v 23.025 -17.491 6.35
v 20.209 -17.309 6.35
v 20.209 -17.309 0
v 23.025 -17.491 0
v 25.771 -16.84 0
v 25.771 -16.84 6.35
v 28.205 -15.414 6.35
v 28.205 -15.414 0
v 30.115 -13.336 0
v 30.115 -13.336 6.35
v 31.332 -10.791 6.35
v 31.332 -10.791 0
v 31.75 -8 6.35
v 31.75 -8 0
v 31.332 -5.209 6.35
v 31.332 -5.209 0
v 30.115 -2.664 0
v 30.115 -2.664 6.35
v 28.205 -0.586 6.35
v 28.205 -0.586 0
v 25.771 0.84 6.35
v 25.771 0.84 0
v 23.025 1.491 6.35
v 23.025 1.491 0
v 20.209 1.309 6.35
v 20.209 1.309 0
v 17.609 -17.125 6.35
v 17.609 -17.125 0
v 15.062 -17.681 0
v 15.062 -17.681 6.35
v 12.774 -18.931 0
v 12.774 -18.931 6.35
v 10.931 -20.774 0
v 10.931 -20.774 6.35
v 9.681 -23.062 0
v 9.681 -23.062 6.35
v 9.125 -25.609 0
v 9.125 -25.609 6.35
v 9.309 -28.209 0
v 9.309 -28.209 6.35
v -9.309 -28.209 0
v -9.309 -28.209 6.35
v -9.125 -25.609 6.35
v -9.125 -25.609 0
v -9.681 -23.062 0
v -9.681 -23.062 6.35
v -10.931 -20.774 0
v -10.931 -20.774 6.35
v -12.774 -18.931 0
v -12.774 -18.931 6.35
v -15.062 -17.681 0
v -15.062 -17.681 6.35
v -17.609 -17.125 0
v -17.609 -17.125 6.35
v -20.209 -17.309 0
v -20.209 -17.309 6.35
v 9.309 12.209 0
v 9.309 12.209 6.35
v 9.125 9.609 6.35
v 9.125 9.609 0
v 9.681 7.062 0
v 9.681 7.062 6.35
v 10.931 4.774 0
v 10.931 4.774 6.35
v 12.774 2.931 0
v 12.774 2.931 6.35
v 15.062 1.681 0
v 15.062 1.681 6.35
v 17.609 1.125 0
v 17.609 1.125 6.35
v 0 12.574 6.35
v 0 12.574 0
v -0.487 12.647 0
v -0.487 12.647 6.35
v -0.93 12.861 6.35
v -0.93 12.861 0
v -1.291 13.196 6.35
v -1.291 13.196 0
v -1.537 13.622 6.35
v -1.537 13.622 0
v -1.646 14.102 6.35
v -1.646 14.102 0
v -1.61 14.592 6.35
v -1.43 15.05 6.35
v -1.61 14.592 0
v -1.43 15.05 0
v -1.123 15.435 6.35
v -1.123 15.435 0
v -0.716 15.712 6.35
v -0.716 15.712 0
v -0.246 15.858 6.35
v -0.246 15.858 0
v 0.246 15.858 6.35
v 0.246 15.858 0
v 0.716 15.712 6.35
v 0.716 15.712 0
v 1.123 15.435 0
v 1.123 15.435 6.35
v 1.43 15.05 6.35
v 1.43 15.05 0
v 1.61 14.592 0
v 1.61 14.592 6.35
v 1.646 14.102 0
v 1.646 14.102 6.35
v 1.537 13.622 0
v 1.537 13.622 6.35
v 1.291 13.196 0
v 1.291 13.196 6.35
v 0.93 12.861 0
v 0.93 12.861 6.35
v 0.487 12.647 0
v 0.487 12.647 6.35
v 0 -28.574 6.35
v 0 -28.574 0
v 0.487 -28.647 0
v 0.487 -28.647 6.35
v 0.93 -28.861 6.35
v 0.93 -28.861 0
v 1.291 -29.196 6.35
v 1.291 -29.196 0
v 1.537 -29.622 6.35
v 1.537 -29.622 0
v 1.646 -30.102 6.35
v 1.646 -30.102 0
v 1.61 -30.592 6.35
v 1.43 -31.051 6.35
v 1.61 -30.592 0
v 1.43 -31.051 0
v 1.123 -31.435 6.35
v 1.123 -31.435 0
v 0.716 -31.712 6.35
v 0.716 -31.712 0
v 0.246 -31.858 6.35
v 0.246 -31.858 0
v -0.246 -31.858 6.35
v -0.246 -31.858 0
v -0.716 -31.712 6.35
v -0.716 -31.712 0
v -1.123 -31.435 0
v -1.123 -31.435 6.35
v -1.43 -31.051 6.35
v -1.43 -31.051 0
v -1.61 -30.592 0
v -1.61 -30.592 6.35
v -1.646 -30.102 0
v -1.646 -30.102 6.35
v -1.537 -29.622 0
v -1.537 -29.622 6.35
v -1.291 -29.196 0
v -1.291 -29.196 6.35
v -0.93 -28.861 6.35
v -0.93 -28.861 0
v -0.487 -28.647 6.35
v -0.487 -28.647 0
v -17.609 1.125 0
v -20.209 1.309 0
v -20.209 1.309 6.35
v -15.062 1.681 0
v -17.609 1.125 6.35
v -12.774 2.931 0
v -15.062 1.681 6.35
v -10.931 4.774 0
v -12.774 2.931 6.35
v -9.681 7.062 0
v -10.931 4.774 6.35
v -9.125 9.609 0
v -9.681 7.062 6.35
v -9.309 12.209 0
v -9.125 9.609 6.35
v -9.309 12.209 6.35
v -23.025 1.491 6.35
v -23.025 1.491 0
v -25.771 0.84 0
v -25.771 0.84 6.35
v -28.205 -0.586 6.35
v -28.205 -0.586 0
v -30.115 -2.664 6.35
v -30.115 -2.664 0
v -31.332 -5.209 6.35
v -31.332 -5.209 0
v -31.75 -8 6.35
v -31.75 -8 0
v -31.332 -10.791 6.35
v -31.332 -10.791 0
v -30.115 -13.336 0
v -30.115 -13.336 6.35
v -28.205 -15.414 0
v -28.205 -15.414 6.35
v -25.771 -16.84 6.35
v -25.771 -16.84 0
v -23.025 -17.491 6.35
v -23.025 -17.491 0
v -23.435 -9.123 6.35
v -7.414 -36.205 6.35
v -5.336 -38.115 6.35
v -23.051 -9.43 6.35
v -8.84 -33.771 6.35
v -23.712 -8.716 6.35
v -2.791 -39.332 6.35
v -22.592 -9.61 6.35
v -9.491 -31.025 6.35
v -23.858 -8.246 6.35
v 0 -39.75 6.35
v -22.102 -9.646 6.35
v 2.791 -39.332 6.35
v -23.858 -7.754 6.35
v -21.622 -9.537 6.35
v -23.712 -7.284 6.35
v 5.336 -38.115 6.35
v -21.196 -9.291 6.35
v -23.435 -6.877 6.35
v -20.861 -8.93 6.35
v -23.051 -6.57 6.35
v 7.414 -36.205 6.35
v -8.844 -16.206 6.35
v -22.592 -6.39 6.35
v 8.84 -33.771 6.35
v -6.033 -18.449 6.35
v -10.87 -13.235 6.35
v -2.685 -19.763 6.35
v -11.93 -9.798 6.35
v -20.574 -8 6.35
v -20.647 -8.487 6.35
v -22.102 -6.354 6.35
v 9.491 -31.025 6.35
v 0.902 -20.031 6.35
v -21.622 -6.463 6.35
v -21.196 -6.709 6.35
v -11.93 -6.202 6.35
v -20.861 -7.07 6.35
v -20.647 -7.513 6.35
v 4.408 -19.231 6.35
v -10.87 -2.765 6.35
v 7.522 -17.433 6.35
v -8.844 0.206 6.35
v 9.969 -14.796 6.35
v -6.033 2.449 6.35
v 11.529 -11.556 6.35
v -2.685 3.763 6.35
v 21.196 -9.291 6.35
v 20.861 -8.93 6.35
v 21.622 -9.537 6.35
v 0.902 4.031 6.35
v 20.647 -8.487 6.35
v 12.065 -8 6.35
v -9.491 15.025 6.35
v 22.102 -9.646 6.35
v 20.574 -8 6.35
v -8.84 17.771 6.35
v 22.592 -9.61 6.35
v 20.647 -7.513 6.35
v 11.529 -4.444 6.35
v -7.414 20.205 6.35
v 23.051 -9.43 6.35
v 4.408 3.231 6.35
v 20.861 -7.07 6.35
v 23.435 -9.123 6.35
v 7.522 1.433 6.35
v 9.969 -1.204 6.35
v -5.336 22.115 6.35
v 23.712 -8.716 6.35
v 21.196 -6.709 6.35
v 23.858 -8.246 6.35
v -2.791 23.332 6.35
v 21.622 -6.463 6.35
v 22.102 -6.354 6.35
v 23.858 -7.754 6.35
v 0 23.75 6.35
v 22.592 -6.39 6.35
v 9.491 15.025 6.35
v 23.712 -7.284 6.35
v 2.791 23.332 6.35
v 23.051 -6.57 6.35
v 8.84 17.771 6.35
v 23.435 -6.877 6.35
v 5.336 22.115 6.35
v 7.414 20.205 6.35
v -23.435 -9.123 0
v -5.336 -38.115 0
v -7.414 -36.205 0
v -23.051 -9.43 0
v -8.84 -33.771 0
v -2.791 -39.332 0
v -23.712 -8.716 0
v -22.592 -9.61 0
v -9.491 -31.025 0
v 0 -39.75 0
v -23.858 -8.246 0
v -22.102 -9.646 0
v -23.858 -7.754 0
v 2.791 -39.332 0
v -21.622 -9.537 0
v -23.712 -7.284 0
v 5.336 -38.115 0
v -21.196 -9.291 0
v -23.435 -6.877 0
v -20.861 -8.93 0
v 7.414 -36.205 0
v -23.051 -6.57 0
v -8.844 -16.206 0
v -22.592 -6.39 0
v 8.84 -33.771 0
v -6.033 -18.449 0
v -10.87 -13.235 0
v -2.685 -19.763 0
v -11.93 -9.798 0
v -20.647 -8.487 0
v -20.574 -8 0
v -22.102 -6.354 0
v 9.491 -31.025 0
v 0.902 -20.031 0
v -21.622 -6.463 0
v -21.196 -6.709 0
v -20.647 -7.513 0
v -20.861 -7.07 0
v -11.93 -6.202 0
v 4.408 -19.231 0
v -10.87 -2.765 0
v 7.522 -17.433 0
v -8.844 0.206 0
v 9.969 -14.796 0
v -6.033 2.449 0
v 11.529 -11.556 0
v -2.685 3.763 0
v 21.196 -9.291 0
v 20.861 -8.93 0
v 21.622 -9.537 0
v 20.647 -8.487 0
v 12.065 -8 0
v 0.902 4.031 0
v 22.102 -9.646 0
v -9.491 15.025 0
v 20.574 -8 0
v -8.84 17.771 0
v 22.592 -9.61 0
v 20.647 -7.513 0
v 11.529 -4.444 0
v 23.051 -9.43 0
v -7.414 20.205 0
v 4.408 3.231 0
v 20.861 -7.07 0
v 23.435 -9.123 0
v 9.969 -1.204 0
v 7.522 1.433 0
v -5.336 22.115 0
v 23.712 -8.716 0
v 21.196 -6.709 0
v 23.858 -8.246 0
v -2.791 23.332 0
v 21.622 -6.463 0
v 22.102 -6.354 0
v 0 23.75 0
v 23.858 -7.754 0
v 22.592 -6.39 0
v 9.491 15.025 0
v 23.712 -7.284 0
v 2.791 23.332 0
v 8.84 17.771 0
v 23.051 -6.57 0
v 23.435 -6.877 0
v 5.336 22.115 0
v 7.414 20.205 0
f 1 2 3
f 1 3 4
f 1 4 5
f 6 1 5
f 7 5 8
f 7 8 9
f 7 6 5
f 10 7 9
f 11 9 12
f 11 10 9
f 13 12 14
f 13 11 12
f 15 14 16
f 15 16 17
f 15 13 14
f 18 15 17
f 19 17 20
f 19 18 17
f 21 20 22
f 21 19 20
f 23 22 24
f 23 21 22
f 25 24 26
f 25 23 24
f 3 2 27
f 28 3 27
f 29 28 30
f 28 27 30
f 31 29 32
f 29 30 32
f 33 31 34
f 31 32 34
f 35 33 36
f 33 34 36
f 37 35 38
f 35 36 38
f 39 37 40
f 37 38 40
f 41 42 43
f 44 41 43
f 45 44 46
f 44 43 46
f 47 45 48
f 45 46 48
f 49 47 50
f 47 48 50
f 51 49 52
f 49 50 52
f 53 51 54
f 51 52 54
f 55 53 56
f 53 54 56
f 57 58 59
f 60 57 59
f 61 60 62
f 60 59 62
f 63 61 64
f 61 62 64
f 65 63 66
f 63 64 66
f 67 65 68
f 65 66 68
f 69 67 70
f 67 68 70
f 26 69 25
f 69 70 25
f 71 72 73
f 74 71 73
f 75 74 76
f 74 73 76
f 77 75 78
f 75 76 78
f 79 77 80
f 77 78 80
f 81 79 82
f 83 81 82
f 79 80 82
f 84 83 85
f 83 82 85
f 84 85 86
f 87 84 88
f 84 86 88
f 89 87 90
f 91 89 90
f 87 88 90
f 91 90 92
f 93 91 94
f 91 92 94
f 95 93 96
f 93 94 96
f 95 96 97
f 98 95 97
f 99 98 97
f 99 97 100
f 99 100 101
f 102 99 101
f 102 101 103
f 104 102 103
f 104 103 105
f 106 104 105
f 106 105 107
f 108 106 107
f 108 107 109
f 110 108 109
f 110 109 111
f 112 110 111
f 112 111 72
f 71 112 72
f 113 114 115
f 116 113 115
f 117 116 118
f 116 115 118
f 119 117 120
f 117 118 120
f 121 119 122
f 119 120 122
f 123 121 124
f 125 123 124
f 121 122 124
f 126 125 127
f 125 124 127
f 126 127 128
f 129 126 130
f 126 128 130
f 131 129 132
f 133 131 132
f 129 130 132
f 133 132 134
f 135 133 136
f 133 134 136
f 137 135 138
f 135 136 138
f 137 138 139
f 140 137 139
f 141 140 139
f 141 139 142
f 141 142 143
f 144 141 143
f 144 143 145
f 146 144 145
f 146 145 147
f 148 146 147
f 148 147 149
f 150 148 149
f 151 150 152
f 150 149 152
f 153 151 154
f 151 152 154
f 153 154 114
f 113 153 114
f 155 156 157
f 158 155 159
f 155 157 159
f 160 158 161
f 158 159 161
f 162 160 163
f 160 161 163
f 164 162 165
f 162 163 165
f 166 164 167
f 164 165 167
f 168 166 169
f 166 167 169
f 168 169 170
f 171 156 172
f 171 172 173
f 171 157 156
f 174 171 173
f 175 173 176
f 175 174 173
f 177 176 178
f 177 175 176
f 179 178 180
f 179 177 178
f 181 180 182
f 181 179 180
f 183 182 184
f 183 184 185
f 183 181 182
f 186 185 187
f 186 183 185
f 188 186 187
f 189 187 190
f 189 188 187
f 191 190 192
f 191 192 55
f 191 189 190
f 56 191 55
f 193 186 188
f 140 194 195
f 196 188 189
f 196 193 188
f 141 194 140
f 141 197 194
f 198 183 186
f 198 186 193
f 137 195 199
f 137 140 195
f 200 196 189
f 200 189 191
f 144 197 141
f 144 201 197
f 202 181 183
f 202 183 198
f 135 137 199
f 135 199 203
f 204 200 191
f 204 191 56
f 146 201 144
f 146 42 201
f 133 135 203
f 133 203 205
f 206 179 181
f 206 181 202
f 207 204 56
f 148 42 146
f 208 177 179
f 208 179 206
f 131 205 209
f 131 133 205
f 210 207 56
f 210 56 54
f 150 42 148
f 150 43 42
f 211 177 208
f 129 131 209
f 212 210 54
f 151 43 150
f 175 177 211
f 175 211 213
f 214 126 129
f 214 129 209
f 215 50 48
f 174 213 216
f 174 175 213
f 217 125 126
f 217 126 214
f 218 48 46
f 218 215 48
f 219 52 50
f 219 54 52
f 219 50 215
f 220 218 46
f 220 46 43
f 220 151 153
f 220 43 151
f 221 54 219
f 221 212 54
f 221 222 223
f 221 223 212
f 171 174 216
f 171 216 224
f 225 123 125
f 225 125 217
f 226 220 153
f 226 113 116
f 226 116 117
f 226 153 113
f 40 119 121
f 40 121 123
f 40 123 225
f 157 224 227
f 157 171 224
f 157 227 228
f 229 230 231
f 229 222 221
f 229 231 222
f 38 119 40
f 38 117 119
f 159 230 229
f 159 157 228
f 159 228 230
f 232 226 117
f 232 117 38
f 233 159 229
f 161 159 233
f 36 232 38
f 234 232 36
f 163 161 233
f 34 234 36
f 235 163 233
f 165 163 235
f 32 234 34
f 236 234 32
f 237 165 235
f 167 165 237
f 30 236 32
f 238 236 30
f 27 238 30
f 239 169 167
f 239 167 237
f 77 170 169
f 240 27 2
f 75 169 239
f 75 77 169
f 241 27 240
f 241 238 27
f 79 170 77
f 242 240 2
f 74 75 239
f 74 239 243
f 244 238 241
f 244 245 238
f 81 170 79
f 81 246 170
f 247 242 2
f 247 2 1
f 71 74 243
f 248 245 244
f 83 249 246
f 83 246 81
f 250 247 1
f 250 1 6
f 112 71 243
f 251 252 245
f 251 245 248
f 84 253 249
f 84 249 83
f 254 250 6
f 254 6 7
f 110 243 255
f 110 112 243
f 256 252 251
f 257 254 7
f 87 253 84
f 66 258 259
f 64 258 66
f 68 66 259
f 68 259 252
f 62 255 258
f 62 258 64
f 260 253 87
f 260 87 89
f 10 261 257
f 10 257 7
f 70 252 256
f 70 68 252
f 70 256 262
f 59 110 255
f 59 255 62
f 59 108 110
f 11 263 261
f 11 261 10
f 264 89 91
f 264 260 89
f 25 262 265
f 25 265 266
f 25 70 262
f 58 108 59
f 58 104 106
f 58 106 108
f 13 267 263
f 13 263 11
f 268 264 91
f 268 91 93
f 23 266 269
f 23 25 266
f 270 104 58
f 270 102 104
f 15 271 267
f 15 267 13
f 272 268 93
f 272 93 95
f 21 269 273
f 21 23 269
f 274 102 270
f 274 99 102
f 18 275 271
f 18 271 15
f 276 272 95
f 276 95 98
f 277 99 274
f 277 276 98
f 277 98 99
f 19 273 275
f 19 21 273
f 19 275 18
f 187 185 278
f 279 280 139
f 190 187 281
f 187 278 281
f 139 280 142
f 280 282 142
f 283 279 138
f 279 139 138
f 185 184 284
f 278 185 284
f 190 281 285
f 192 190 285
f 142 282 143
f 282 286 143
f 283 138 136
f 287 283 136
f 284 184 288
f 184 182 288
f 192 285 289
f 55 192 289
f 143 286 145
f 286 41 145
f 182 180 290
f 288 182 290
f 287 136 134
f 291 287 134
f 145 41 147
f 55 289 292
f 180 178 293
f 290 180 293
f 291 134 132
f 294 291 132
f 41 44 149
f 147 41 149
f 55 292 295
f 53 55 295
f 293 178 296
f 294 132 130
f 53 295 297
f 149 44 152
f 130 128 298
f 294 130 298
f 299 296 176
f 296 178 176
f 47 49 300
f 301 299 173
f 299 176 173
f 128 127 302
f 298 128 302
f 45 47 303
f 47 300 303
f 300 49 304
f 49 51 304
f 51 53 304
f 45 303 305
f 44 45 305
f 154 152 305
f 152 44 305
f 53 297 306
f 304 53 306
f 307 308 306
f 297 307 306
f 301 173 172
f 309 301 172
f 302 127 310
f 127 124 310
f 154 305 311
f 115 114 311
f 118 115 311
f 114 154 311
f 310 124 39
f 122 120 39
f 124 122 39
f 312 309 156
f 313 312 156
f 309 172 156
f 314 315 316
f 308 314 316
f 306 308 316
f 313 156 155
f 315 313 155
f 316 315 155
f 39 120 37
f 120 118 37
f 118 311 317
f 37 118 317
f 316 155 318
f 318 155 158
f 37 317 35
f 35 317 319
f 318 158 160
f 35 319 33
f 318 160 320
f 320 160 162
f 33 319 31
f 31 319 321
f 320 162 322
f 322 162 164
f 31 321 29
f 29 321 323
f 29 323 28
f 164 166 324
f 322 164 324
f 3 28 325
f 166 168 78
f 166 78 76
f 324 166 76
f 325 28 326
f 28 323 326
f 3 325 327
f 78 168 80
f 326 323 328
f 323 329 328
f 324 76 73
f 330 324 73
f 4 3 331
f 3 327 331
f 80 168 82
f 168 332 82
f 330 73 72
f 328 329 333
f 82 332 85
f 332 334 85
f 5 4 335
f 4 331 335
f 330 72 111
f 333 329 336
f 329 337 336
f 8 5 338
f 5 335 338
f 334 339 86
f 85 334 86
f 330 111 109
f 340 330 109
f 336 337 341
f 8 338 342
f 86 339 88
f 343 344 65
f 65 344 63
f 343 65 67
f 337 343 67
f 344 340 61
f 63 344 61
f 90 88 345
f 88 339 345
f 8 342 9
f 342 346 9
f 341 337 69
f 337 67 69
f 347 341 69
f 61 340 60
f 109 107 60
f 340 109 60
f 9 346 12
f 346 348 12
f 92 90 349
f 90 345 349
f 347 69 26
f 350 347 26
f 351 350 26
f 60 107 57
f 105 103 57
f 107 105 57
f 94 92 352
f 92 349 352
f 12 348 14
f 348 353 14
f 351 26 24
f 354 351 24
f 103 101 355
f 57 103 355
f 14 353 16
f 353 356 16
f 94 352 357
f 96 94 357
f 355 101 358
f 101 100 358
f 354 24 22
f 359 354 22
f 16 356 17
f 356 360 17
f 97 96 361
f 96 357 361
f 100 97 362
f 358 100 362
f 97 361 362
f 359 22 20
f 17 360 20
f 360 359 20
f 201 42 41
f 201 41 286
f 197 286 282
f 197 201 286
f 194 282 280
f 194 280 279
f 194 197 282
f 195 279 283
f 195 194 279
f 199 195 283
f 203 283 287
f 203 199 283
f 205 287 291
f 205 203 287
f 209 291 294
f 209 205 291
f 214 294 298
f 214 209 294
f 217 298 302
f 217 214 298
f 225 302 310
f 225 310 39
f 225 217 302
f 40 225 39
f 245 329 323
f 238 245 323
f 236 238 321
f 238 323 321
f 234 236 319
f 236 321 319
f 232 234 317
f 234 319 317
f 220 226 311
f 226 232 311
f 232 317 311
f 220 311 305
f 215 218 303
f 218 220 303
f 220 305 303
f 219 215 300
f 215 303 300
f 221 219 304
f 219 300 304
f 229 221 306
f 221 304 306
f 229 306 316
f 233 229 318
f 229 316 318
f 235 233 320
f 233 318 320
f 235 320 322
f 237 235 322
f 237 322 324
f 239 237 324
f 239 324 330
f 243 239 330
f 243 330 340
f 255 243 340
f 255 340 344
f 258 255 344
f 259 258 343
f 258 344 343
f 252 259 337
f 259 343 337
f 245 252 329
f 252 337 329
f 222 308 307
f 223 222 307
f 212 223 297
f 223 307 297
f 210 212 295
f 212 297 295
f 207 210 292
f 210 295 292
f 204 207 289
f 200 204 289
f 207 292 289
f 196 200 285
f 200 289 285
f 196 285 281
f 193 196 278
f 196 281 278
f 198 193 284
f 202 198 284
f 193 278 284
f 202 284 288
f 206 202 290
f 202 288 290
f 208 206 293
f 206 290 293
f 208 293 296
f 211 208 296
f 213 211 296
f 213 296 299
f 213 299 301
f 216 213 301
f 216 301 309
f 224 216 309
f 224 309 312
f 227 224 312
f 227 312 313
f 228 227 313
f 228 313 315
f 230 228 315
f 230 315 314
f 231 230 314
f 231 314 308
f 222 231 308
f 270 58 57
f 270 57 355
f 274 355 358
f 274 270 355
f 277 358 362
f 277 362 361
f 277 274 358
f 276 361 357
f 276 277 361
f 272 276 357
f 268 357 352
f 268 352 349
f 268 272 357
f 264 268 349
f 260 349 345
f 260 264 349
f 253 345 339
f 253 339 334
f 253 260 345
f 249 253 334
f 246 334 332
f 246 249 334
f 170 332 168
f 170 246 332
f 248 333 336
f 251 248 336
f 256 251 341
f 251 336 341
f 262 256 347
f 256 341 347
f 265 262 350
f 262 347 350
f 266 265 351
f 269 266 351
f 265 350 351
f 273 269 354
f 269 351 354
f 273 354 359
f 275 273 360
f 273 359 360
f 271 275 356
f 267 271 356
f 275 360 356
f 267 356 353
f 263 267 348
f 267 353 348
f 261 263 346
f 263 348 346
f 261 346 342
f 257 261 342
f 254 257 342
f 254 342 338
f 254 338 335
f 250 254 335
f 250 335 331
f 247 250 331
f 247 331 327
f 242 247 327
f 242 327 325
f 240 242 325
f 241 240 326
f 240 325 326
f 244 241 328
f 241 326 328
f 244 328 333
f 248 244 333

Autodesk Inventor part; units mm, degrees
ref_plane "YZ Plane" through (0, 0, 0) normal (1, 0, 0) x (0, 1, 0)
ref_plane "XZ Plane" through (0, 0, 0) normal (0, 1, 0) x (-1, 0, 0)
ref_plane "XY Plane" through (0, 0, 0) normal (0, 0, 1) x (1, 0, 0)
sketch "Sketch1" plane through (0, 0, 0) normal (0, 0, 1) x (1, 0, 0)
  arc A0 (9.4191, 43.3754) -> (11.0761, 45.5644) centre (1.4765, 51.109) ccw projected
  arc A1 (2.6827, 44.1627) -> (9.4191, 43.3754) centre (6.35, 46.3277) ccw projected
  arc A2 (1.5753, 46.6749) -> (2.6827, 44.1627) centre (12.1948, 49.8562) ccw projected
  arc A3 (-9.4191, 43.3754) -> (-2.6827, 44.1627) centre (-6.35, 46.3277) ccw projected
  arc A4 (-11.0761, 45.5644) -> (-9.4191, 43.3754) centre (-1.4765, 51.109) ccw projected
  arc A5 (-21.0132, 39.8183) -> (-14.64, 42.138) centre (-18.7077, 43.3989) ccw projected
  arc A6 (-23.1303, 41.5662) -> (-21.0132, 39.8183) centre (-15.0682, 49.1752) ccw projected
  arc A7 (-31.4745, 33.6834) -> (-25.808, 37.4103) centre (-30.0568, 37.6992) ccw projected
  arc A8 (-33.9376, 34.896) -> (-31.4745, 33.6834) centre (-27.8475, 44.1591) ccw projected
  arc A9 (-40.2389, 25.3013) -> (-35.5847, 30.2346) centre (-39.7856, 29.5357) ccw projected
  arc A10 (-42.9153, 25.9131) -> (-40.2389, 25.3013) centre (-39.1256, 36.331) ccw projected
  arc A11 (-46.8341, 15.1239) -> (-43.443, 20.9975) centre (-47.3695, 19.3488) ccw projected
  arc A12 (-49.5794, 15.1021) -> (-46.8341, 15.1239) centre (-48.2944, 26.1131) ccw projected
  arc A13 (-50.9044, 3.6999) -> (-48.9593, 10.1973) centre (-52.3997, 7.6874) ccw projected
  arc A14 (-53.5707, 3.0455) -> (-50.9044, 3.6999) centre (-54.8597, 14.0561) ccw projected
  arc A15 (-52.2305, -8.3548) -> (-51.8361, -1.584) centre (-54.605, -4.8196) ccw projected
  arc A16 (-54.674, -9.6064) -> (-52.2305, -8.3548) centre (-58.4674, 0.8101) ccw projected
  arc A17 (-50.7408, -20.3904) -> (-51.9185, -13.7112) centre (-53.8666, -17.4981) ccw projected
  arc A18 (-52.8298, -22.1718) -> (-50.7408, -20.3904) centre (-58.9232, -12.9109) ccw projected
  arc A19 (-46.5156, -31.7581) -> (-49.2019, -25.5305) centre (-50.2242, -29.6646) ccw projected
  arc A20 (-48.1375, -33.9732) -> (-46.5156, -31.7581) centre (-56.2023, -26.3671) ccw projected
  arc A21 (-39.7828, -41.8449) -> (-43.8329, -36.4047) centre (-43.8742, -40.6631) ccw projected
  arc A22 (-40.8501, -44.3744) -> (-39.7828, -41.8449) centre (-50.4517, -38.8332) ccw projected
  arc A23 (-30.9053, -50.1072) -> (-36.1008, -45.7476) centre (-35.1589, -49.9008) ccw projected
  arc A24 (-31.3605, -52.8146) -> (-30.9053, -50.1072) centre (-41.9811, -49.637) ccw projected
  arc A25 (-20.3617, -56.0994) -> (-26.4225, -53.0555) centre (-24.5482, -56.8795) ccw projected
  arc A26 (-20.1802, -58.8388) -> (-20.3617, -56.0994) centre (-31.2473, -58.1962) ccw projected
  arc A27 (-8.7203, -59.4986) -> (-15.3198, -57.9345) centre (-12.6141, -61.2232) ccw projected
  arc A28 (-7.912, -62.1223) -> (-8.7203, -59.4986) centre (-18.829, -64.0493) ccw projected
  arc A29 (3.3911, -60.1215) -> (-3.3911, -60.1215) centre (0, -62.6976) ccw projected
  arc A30 (4.7827, -62.4881) -> (3.3911, -60.1215) centre (-5.3956, -66.8807) ccw projected
  arc A31 (15.3198, -57.9345) -> (8.7203, -59.4986) centre (12.6141, -61.2232) ccw projected
  arc A32 (17.2196, -59.9164) -> (15.3198, -57.9345) centre (8.3287, -66.5379) ccw projected
  arc A33 (26.4225, -53.0555) -> (20.3617, -56.0994) centre (24.5482, -56.8795) ccw projected
  arc A34 (28.7282, -54.5458) -> (26.4225, -53.0555) centre (21.6039, -63.0393) ccw projected
  arc A35 (36.1008, -45.7476) -> (30.9053, -50.1072) centre (35.1589, -49.9008) ccw projected
  arc A36 (38.688, -46.666) -> (36.1008, -45.7476) centre (33.7145, -56.5735) ccw projected
  arc A37 (43.8329, -36.4047) -> (39.7828, -41.8449) centre (43.8742, -40.6631) ccw projected
  arc A38 (46.5622, -36.7017) -> (43.8329, -36.4047) centre (44.0076, -47.4891) ccw projected
  arc A39 (49.2019, -25.5305) -> (46.5156, -31.7581) centre (50.2242, -29.6646) ccw projected
  arc A40 (51.9262, -25.19) -> (49.2019, -25.5305) centre (51.9282, -36.2758) ccw projected
  arc A41 (51.9185, -13.7112) -> (50.7408, -20.3904) centre (53.8666, -17.4981) ccw projected
  arc A42 (54.4908, -12.7517) -> (51.9185, -13.7112) centre (57.0493, -23.5382) ccw projected
  arc A43 (51.8361, -1.584) -> (52.2305, -8.3548) centre (54.605, -4.8196) ccw projected
  arc A44 (54.1178, -0.0572) -> (51.8361, -1.584) centre (59.0949, -9.9629) ccw projected
  arc A45 (48.9593, 10.1973) -> (50.9044, 3.6999) centre (52.3997, 7.6874) ccw projected
  arc A46 (50.8273, 12.2092) -> (48.9593, 10.1973) centre (57.9546, 3.7182) ccw projected
  arc A47 (43.443, 20.9975) -> (46.8341, 15.1239) centre (47.3695, 19.3488) ccw projected
  arc A48 (44.7967, 23.386) -> (43.443, 20.9975) centre (53.69, 16.7676) ccw projected
  arc A49 (35.5847, 30.2346) -> (40.2389, 25.3013) centre (39.7856, 29.5357) ccw projected
  arc A50 (36.3511, 32.8708) -> (35.5847, 30.2346) centre (46.531, 28.4818) ccw projected
  arc A51 (25.808, 37.4103) -> (31.4745, 33.6834) centre (30.0568, 37.6992) ccw projected
  arc A52 (25.9458, 40.1523) -> (25.808, 37.4103) centre (36.8635, 38.2292) ccw projected
  arc A53 (14.64, 42.138) -> (21.0132, 39.8183) centre (18.7077, 43.3989) ccw projected
  arc A54 (14.1417, 44.8378) -> (14.64, 42.138) centre (25.2086, 45.4844) ccw projected
  circle A55 centre (0, -8) radius 12.065
  circle A56 centre (0, -8) radius 22.225
  circle A57 centre (0, -8) radius 31.75
  circle A58 centre (22.225, -8) radius 1.27
  circle A59 centre (0, -30.225) radius 1.27
  circle A60 centre (-22.225, -8) radius 1.27
  circle A61 centre (0, 14.225) radius 1.27
  circle A62 centre (0, -8) radius 12.065 projected
  line L0 (1.4863, 46.9888) -> (1.1981, 48.0928) projected
  arc A63 (1.1981, 48.0928) -> (0.2767, 50.1653) centre (-5.564, 46.3277) ccw projected
  arc A64 (-2.6827, 44.1627) -> (-1.5753, 46.6749) centre (-12.1948, 49.8562) ccw projected
  line L1 (-11.2351, 45.8493) -> (-11.7701, 46.8571) projected
  arc A65 (-11.7701, 46.8571) -> (-13.1446, 48.6613) centre (-17.9429, 43.5802) ccw projected
  arc A66 (-14.64, 42.138) -> (-14.1417, 44.8378) centre (-25.2086, 45.4844) ccw projected
  line L2 (-23.3508, 41.8068) -> (-24.1038, 42.6641) projected
  arc A67 (-24.1038, 42.6641) -> (-25.8573, 44.1026) centre (-29.3544, 38.0519) ccw projected
  arc A68 (-25.808, 37.4103) -> (-25.9458, 40.1523) centre (-36.8635, 38.2292) ccw projected
  line L3 (-34.2076, 35.0792) -> (-35.138, 35.7397) projected
  arc A69 (-35.138, 35.7397) -> (-37.176, 36.7351) centre (-39.1835, 30.041) ccw projected
  arc A70 (-35.5847, 30.2346) -> (-36.3511, 32.8708) centre (-46.531, 28.4818) ccw projected
  line L4 (-43.2203, 26.0292) -> (-44.2779, 26.4573) projected
  arc A71 (-44.2779, 26.4573) -> (-46.4905, 26.9559) centre (-46.9001, 19.9793) ccw projected
  arc A72 (-43.443, 20.9975) -> (-44.7967, 23.386) centre (-53.69, 16.7676) ccw projected
  line L5 (-49.9029, 15.1447) -> (-51.0308, 15.3173) projected
  arc A73 (-51.0308, 15.3173) -> (-53.2988, 15.2922) centre (-52.0884, 8.4092) ccw projected
  arc A74 (-48.9593, 10.1973) -> (-50.8273, 12.2092) centre (-57.9546, 3.7182) ccw projected
  line L6 (-53.8953, 3.0124) -> (-55.0326, 2.9203) projected
  arc A75 (-55.0326, 2.9203) -> (-57.2336, 2.3728) centre (-54.4685, -4.0456) ccw projected
  arc A76 (-51.8361, -1.584) -> (-54.1178, -0.0572) centre (-59.0949, -9.9629) ccw projected
  line L7 (-54.9822, -9.7136) -> (-56.0676, -10.0655) projected
  arc A77 (-56.0676, -10.0655) -> (-58.083, -11.1058) centre (-53.9123, -16.7135) ccw projected
  arc A78 (-51.9185, -13.7112) -> (-54.4908, -12.7517) centre (-57.0493, -23.5382) ccw projected
  line L8 (-53.105, -22.3471) -> (-54.08, -22.9399) projected
  arc A79 (-54.08, -22.9399) -> (-55.8011, -24.4169) centre (-50.4496, -28.9116) ccw projected
  arc A80 (-49.2019, -25.5305) -> (-51.9262, -25.19) centre (-51.9282, -36.2758) ccw projected
  line L9 (-48.3648, -34.2073) -> (-49.1769, -35.0089) projected
  arc A81 (-49.1769, -35.0089) -> (-50.511, -36.843) centre (-44.2672, -39.9824) ccw projected
  arc A82 (-43.8329, -36.4047) -> (-46.5622, -36.7017) centre (-44.0076, -47.4891) ccw projected
  line L10 (-41.0173, -44.6545) -> (-41.6226, -45.6218) projected
  arc A83 (-41.6226, -45.6218) -> (-42.4978, -47.7142) centre (-35.6983, -49.3291) ccw projected
  arc A84 (-36.1008, -45.7476) -> (-38.688, -46.666) centre (-33.7145, -56.5735) ccw projected
  line L11 (-31.4586, -53.1258) -> (-31.8245, -54.2065) projected
  arc A85 (-31.8245, -54.2065) -> (-32.1936, -56.4444) centre (-25.2049, -56.4476) ccw projected
  arc A86 (-26.4225, -53.0555) -> (-28.7282, -54.5458) centre (-21.6039, -63.0393) ccw projected
  line L12 (-20.2039, -59.1642) -> (-20.3107, -60.3003) projected
  arc A87 (-20.3107, -60.3003) -> (-20.1537, -62.5629) centre (-13.3527, -60.9544) ccw projected
  arc A88 (-15.3198, -57.9345) -> (-17.2196, -59.9164) centre (-8.3287, -66.5379) ccw projected
  line L13 (-7.86, -62.4444) -> (-7.7019, -63.5745) projected
  arc A89 (-7.7019, -63.5745) -> (-7.0274, -65.7399) centre (-0.7807, -62.6063) ccw projected
  arc A90 (-3.3911, -60.1215) -> (-4.7827, -62.4881) centre (5.3956, -66.8807) ccw projected
  line L14 (4.9076, -62.7895) -> (5.322, -63.8527) projected
  arc A91 (5.322, -63.8527) -> (6.4777, -65.8042) centre (11.8334, -61.3144) ccw projected
  arc A92 (8.7203, -59.4986) -> (7.912, -62.1223) centre (18.829, -64.0493) ccw projected
  line L15 (17.4107, -60.1809) -> (18.0591, -61.1198) projected
  arc A93 (18.0591, -61.1198) -> (19.6337, -62.7522) centre (23.8096, -57.1484) ccw projected
  arc A94 (20.3617, -56.0994) -> (20.1802, -58.8388) centre (31.2473, -58.1962) ccw projected
  line L16 (28.9751, -54.7592) -> (29.8226, -55.5232) projected
  arc A95 (29.8226, -55.5232) -> (31.7312, -56.7485) centre (34.5022, -50.3327) ccw projected
  arc A96 (30.9053, -50.1072) -> (31.3605, -52.8146) centre (41.9811, -49.637) ccw projected
  line L17 (38.9775, -46.8167) -> (39.9783, -47.3647) projected
  arc A97 (39.9783, -47.3647) -> (42.118, -48.1167) centre (43.3348, -41.2348) ccw projected
  arc A98 (39.7828, -41.8449) -> (40.8501, -44.3744) centre (50.4517, -38.8332) ccw projected
  line L18 (46.8786, -36.7815) -> (47.9788, -37.084) projected
  arc A99 (47.9788, -37.084) -> (50.2343, -37.3223) centre (49.8312, -30.3453) ccw projected
  arc A100 (46.5156, -31.7581) -> (48.1375, -33.9732) centre (56.2023, -26.3671) ccw projected
  line L19 (52.2524, -25.1948) -> (53.3927, -25.2353) projected
  arc A101 (53.3927, -25.2353) -> (55.6424, -24.9471) centre (53.6412, -18.2511) ccw projected
  arc A102 (50.7408, -20.3904) -> (52.8298, -22.1718) centre (58.9232, -12.9109) ccw projected
  line L20 (54.8093, -12.6811) -> (55.9283, -12.4575) projected
  arc A103 (55.9283, -12.4575) -> (58.0508, -11.6583) centre (54.5593, -5.6043) ccw projected
  arc A104 (52.2305, -8.3548) -> (54.674, -9.6064) centre (58.4674, 0.8101) ccw projected
  line L21 (54.4115, 0.085) -> (55.4487, 0.5606) projected
  arc A105 (55.4487, 0.5606) -> (57.3297, 1.8278) centre (52.5362, 6.9134) ccw projected
  arc A106 (50.9044, 3.6999) -> (53.5707, 3.0455) centre (54.8597, 14.0561) ccw projected
  line L22 (51.0803, 12.4152) -> (51.9799, 13.1172) projected
  arc A107 (51.9799, 13.1172) -> (53.518, 14.784) centre (47.6808, 18.6271) ccw projected
  arc A108 (46.8341, 15.1239) -> (49.5794, 15.1021) centre (48.2944, 26.1131) ccw projected
  line L23 (44.9953, 23.6449) -> (45.7088, 24.5353) projected
  arc A109 (45.7088, 24.5353) -> (46.821, 26.512) centre (40.2549, 28.9053) ccw projected
  arc A110 (40.2389, 25.3013) -> (42.9153, 25.9131) centre (39.1256, 36.331) ccw projected
  line L24 (36.4847, 33.1685) -> (36.9736, 34.1995) projected
  arc A111 (36.9736, 34.1995) -> (37.5999, 36.3794) centre (30.6589, 37.1939) ccw projected
  arc A112 (31.4745, 33.6834) -> (33.9376, 34.896) centre (27.8475, 44.1591) ccw projected
  line L25 (26.0071, 40.4728) -> (26.2451, 41.5887) projected
  arc A113 (26.2451, 41.5887) -> (26.3518, 43.8543) centre (19.4101, 43.0461) ccw projected
  arc A114 (21.0132, 39.8183) -> (23.1303, 41.5662) centre (15.0682, 49.1752) ccw projected
  line L26 (14.1275, 45.1638) -> (14.1017, 46.3046) projected
  ellipse E0 centre (-12.8803, 49.8016) end of major axis (-24.6386, 49.2708) minor radius 11.3649 (-1.5753, 46.6749) -> (-1.4863, 46.9888) ccw projected
  ellipse E1 centre (-25.8631, 45.2731) end of major axis (-37.1821, 42.045) minor radius 11.3649 (-14.1417, 44.8378) -> (-14.1275, 45.1638) ccw projected
  ellipse E2 centre (-37.4516, 37.8727) end of major axis (-47.721, 32.1213) minor radius 11.3649 (-25.9458, 40.1523) -> (-26.0071, 40.4728) ccw projected
  ellipse E3 centre (-47.0211, 27.9993) end of major axis (-55.6873, 20.0346) minor radius 11.3649 (-36.3511, 32.8708) -> (-36.4847, 33.1685) ccw projected
  ellipse E4 centre (-54.0556, 16.1851) end of major axis (-60.6514, 6.4366) minor radius 11.3649 (-44.7967, 23.386) -> (-44.9953, 23.6449) ccw projected
  ellipse E5 centre (-58.176, 3.0671) end of major axis (-62.3459, -7.9398) minor radius 11.3649 (-50.8273, 12.2092) -> (-51.0803, 12.4152) ccw projected
  ellipse E6 centre (-59.1601, -10.6475) end of major axis (-60.6792, -22.3193) minor radius 11.3649 (-54.1178, -0.0572) -> (-54.4115, 0.085) ccw projected
  ellipse E7 centre (-56.9549, -24.2194) end of major axis (-55.7413, -35.9269) minor radius 11.3649 (-54.4908, -12.7517) -> (-54.8093, -12.6811) ccw projected
  ellipse E8 centre (-51.6792, -36.9169) end of major axis (-47.7984, -48.029) minor radius 11.3649 (-51.9262, -25.19) -> (-52.2524, -25.1948) ccw projected
  ellipse E9 centre (-43.6175, -48.0555) end of major axis (-37.2787, -57.9731) minor radius 11.3649 (-46.5622, -36.7017) -> (-46.8786, -36.7815) ccw projected
  ellipse E10 centre (-33.2043, -57.0347) end of major axis (-24.7492, -65.2231) minor radius 11.3649 (-38.688, -46.666) -> (-38.9775, -46.8167) ccw projected
  ellipse E11 centre (-21.0011, -63.3704) end of major axis (-10.8856, -69.3882) minor radius 11.3649 (-28.7282, -54.5458) -> (-28.9751, -54.7592) ccw projected
  ellipse E12 centre (-7.6657, -66.7211) end of major axis (3.565, -70.2439) minor radius 11.3649 (-17.2196, -59.9164) -> (-17.4107, -60.1809) ccw projected
  ellipse E13 centre (6.0829, -66.9061) end of major axis (17.8233, -67.7439) minor radius 11.3649 (-4.7827, -62.4881) -> (-4.9076, -62.7895) ccw projected
  ellipse E14 centre (19.5036, -63.9154) end of major axis (31.1208, -62.0232) minor radius 11.3649 (7.912, -62.1223) -> (7.86, -62.4444) ccw projected
  ellipse E15 centre (31.8729, -57.9104) end of major axis (42.7405, -53.3901) minor radius 11.3649 (20.1802, -58.8388) -> (20.2039, -59.1642) ccw projected
  ellipse E16 centre (42.5239, -49.2147) end of major axis (52.0561, -42.3099) minor radius 11.3649 (31.3605, -52.8146) -> (31.4586, -53.1258) ccw projected
  ellipse E17 centre (50.8824, -38.297) end of major axis (58.5653, -29.3801) minor radius 11.3649 (40.8501, -44.3744) -> (41.0173, -44.6545) ccw projected
  ellipse E18 centre (56.4978, -25.7461) end of major axis (61.9173, -15.2977) minor radius 11.3649 (48.1375, -33.9732) -> (48.3648, -34.2073) ccw projected
  ellipse E19 centre (59.0674, -12.2385) end of major axis (61.9313, -0.8219) minor radius 11.3649 (52.8298, -22.1718) -> (53.105, -22.3471) ccw projected
  ellipse E20 centre (58.4527, 1.4977) end of major axis (58.6065, 13.2669) minor radius 11.3649 (54.674, -9.6064) -> (54.9822, -9.7136) ccw projected
  ellipse E21 centre (54.6868, 14.7218) end of major axis (52.1223, 26.2093) minor radius 11.3649 (53.5707, 3.0455) -> (53.8953, 3.0124) ccw projected
  ellipse E22 centre (47.9727, 26.721) end of major axis (42.8281, 37.3074) minor radius 11.3649 (49.5794, 15.1021) -> (49.9029, 15.1447) ccw projected
  ellipse E23 centre (38.6724, 36.8483) end of major axis (31.2251, 45.963) minor radius 11.3649 (42.9153, 25.9131) -> (43.2203, 26.0292) ccw projected
  ellipse E24 centre (27.2872, 44.5579) end of major axis (17.9387, 51.7094) minor radius 11.3649 (33.9376, 34.896) -> (34.2076, 35.0792) ccw projected
  ellipse E25 centre (14.431, 49.4341) end of major axis (3.6852, 54.2369) minor radius 11.3649 (23.1303, 41.5662) -> (23.3508, 41.8068) ccw projected
  circle A115 centre (22.225, -8) radius 2.3812 projected
  circle A116 centre (0, 14.225) radius 2.3812 projected
  circle A117 centre (0, -30.225) radius 2.3812 projected
  circle A118 centre (-22.225, -8) radius 2.3812 projected
  ellipse E26 centre (12.8803, 49.8016) end of major axis (24.6386, 49.2708) minor radius 11.3649 (1.4863, 46.9888) -> (1.5753, 46.6749) ccw projected
  arc A119 (0.2767, 50.1653) -> (-0.2767, 50.1653) centre (0, -8) ccw projected
  arc A120 (-0.2767, 50.1653) -> (-1.1981, 48.0928) centre (5.564, 46.3277) ccw projected
  line L27 (-1.1981, 48.0928) -> (-1.4863, 46.9888) projected
  ellipse E27 centre (-0.7968, 51.214) end of major axis (10.7669, 53.4091) minor radius 11.3649 (-11.2351, 45.8493) -> (-11.0761, 45.5644) ccw projected
  arc A121 (-13.1446, 48.6613) -> (-13.6831, 48.5337) centre (0, -8) ccw projected
  arc A122 (-13.6831, 48.5337) -> (-14.1017, 46.3046) centre (-7.1148, 46.1465) ccw projected
  line L28 (-14.1017, 46.3046) -> (-14.1275, 45.1638) projected
  ellipse E28 centre (-14.431, 49.4341) end of major axis (-3.6852, 54.2369) minor radius 11.3649 (-23.3508, 41.8068) -> (-23.1303, 41.5662) ccw projected
  arc A123 (-25.8573, 44.1026) -> (-26.3518, 43.8543) centre (0, -8) ccw projected
  arc A124 (-26.3518, 43.8543) -> (-26.2451, 41.5887) centre (-19.4101, 43.0461) ccw projected
  line L29 (-26.2451, 41.5887) -> (-26.0071, 40.4728) projected
  ellipse E29 centre (-27.2872, 44.5579) end of major axis (-17.9387, 51.7094) minor radius 11.3649 (-34.2076, 35.0792) -> (-33.9376, 34.896) ccw projected
  arc A125 (-37.176, 36.7351) -> (-37.5999, 36.3794) centre (0, -8) ccw projected
  arc A126 (-37.5999, 36.3794) -> (-36.9736, 34.1995) centre (-30.6589, 37.1939) ccw projected
  line L30 (-36.9736, 34.1995) -> (-36.4847, 33.1685) projected
  ellipse E30 centre (-38.6724, 36.8483) end of major axis (-31.2251, 45.963) minor radius 11.3649 (-43.2203, 26.0292) -> (-42.9153, 25.9131) ccw projected
  arc A127 (-46.4905, 26.9559) -> (-46.821, 26.512) centre (0, -8) ccw projected
  arc A128 (-46.821, 26.512) -> (-45.7088, 24.5353) centre (-40.2549, 28.9053) ccw projected
  line L31 (-45.7088, 24.5353) -> (-44.9953, 23.6449) projected
  ellipse E31 centre (-47.9727, 26.721) end of major axis (-42.8281, 37.3074) minor radius 11.3649 (-49.9029, 15.1447) -> (-49.5794, 15.1021) ccw projected
  arc A129 (-53.2988, 15.2922) -> (-53.518, 14.784) centre (0, -8) ccw projected
  arc A130 (-53.518, 14.784) -> (-51.9799, 13.1172) centre (-47.6808, 18.6271) ccw projected
  line L32 (-51.9799, 13.1172) -> (-51.0803, 12.4152) projected
  ellipse E32 centre (-54.6868, 14.7218) end of major axis (-52.1223, 26.2093) minor radius 11.3649 (-53.8953, 3.0124) -> (-53.5707, 3.0455) ccw projected
  arc A131 (-57.2336, 2.3728) -> (-57.3297, 1.8278) centre (0, -8) ccw projected
  arc A132 (-57.3297, 1.8278) -> (-55.4487, 0.5606) centre (-52.5362, 6.9134) ccw projected
  line L33 (-55.4487, 0.5606) -> (-54.4115, 0.085) projected
  ellipse E33 centre (-58.4527, 1.4977) end of major axis (-58.6065, 13.2669) minor radius 11.3649 (-54.9822, -9.7136) -> (-54.674, -9.6064) ccw projected
  arc A133 (-58.083, -11.1058) -> (-58.0508, -11.6583) centre (0, -8) ccw projected
  arc A134 (-58.0508, -11.6583) -> (-55.9283, -12.4575) centre (-54.5593, -5.6043) ccw projected
  line L34 (-55.9283, -12.4575) -> (-54.8093, -12.6811) projected
  ellipse E34 centre (-59.0674, -12.2385) end of major axis (-61.9313, -0.8219) minor radius 11.3649 (-53.105, -22.3471) -> (-52.8298, -22.1718) ccw projected
  arc A135 (-55.8011, -24.4169) -> (-55.6424, -24.9471) centre (0, -8) ccw projected
  arc A136 (-55.6424, -24.9471) -> (-53.3927, -25.2353) centre (-53.6412, -18.2511) ccw projected
  line L35 (-53.3927, -25.2353) -> (-52.2524, -25.1948) projected
  ellipse E35 centre (-56.4978, -25.7461) end of major axis (-61.9173, -15.2977) minor radius 11.3649 (-48.3648, -34.2073) -> (-48.1375, -33.9732) ccw projected
  arc A137 (-50.511, -36.843) -> (-50.2343, -37.3223) centre (0, -8) ccw projected
  arc A138 (-50.2343, -37.3223) -> (-47.9788, -37.084) centre (-49.8312, -30.3453) ccw projected
  line L36 (-47.9788, -37.084) -> (-46.8786, -36.7815) projected
  ellipse E36 centre (-50.8824, -38.297) end of major axis (-58.5653, -29.3801) minor radius 11.3649 (-41.0173, -44.6545) -> (-40.8501, -44.3744) ccw projected
  arc A139 (-42.4978, -47.7142) -> (-42.118, -48.1167) centre (0, -8) ccw projected
  arc A140 (-42.118, -48.1167) -> (-39.9783, -47.3647) centre (-43.3348, -41.2348) ccw projected
  line L37 (-39.9783, -47.3647) -> (-38.9775, -46.8167) projected
  ellipse E37 centre (-42.5239, -49.2147) end of major axis (-52.0561, -42.3099) minor radius 11.3649 (-31.4586, -53.1258) -> (-31.3605, -52.8146) ccw projected
  arc A141 (-32.1936, -56.4444) -> (-31.7312, -56.7485) centre (0, -8) ccw projected
  arc A142 (-31.7312, -56.7485) -> (-29.8226, -55.5232) centre (-34.5022, -50.3327) ccw projected
  line L38 (-29.8226, -55.5232) -> (-28.9751, -54.7592) projected
  ellipse E38 centre (-31.8729, -57.9104) end of major axis (-42.7405, -53.3901) minor radius 11.3649 (-20.2039, -59.1642) -> (-20.1802, -58.8388) ccw projected
  arc A143 (-20.1537, -62.5629) -> (-19.6337, -62.7522) centre (0, -8) ccw projected
  arc A144 (-19.6337, -62.7522) -> (-18.0591, -61.1198) centre (-23.8096, -57.1484) ccw projected
  line L39 (-18.0591, -61.1198) -> (-17.4107, -60.1809) projected
  ellipse E39 centre (-19.5036, -63.9154) end of major axis (-31.1208, -62.0232) minor radius 11.3649 (-7.86, -62.4444) -> (-7.912, -62.1223) ccw projected
  arc A145 (-7.0274, -65.7399) -> (-6.4777, -65.8042) centre (0, -8) ccw projected
  arc A146 (-6.4777, -65.8042) -> (-5.322, -63.8527) centre (-11.8334, -61.3144) ccw projected
  line L40 (-5.322, -63.8527) -> (-4.9076, -62.7895) projected
  ellipse E40 centre (-6.0829, -66.9061) end of major axis (-17.8233, -67.7439) minor radius 11.3649 (4.9076, -62.7895) -> (4.7827, -62.4881) ccw projected
  arc A147 (6.4777, -65.8042) -> (7.0274, -65.7399) centre (0, -8) ccw projected
  arc A148 (7.0274, -65.7399) -> (7.7019, -63.5745) centre (0.7807, -62.6063) ccw projected
  line L41 (7.7019, -63.5745) -> (7.86, -62.4444) projected
  ellipse E41 centre (7.6657, -66.7211) end of major axis (-3.565, -70.2439) minor radius 11.3649 (17.4107, -60.1809) -> (17.2196, -59.9164) ccw projected
  arc A149 (19.6337, -62.7522) -> (20.1537, -62.5629) centre (0, -8) ccw projected
  arc A150 (20.1537, -62.5629) -> (20.3107, -60.3003) centre (13.3527, -60.9544) ccw projected
  line L42 (20.3107, -60.3003) -> (20.2039, -59.1642) projected
  ellipse E42 centre (21.0011, -63.3704) end of major axis (10.8856, -69.3882) minor radius 11.3649 (28.9751, -54.7592) -> (28.7282, -54.5458) ccw projected
  arc A151 (31.7312, -56.7485) -> (32.1936, -56.4444) centre (0, -8) ccw projected
  arc A152 (32.1936, -56.4444) -> (31.8245, -54.2065) centre (25.2049, -56.4476) ccw projected
  line L43 (31.8245, -54.2065) -> (31.4586, -53.1258) projected
  ellipse E43 centre (33.2043, -57.0347) end of major axis (24.7492, -65.2231) minor radius 11.3649 (38.9775, -46.8167) -> (38.688, -46.666) ccw projected
  arc A153 (42.118, -48.1167) -> (42.4978, -47.7142) centre (0, -8) ccw projected
  arc A154 (42.4978, -47.7142) -> (41.6226, -45.6218) centre (35.6983, -49.3291) ccw projected
  line L44 (41.6226, -45.6218) -> (41.0173, -44.6545) projected
  ellipse E44 centre (43.6175, -48.0555) end of major axis (37.2787, -57.9731) minor radius 11.3649 (46.8786, -36.7815) -> (46.5622, -36.7017) ccw projected
  arc A155 (50.2343, -37.3223) -> (50.511, -36.843) centre (0, -8) ccw projected
  arc A156 (50.511, -36.843) -> (49.1769, -35.0089) centre (44.2672, -39.9824) ccw projected
  line L45 (49.1769, -35.0089) -> (48.3648, -34.2073) projected
  ellipse E45 centre (51.6792, -36.9169) end of major axis (47.7984, -48.029) minor radius 11.3649 (52.2524, -25.1948) -> (51.9262, -25.19) ccw projected
  arc A157 (55.6424, -24.9471) -> (55.8011, -24.4169) centre (0, -8) ccw projected
  arc A158 (55.8011, -24.4169) -> (54.08, -22.9399) centre (50.4496, -28.9116) ccw projected
  line L46 (54.08, -22.9399) -> (53.105, -22.3471) projected
  ellipse E46 centre (56.9549, -24.2194) end of major axis (55.7413, -35.9269) minor radius 11.3649 (54.8093, -12.6811) -> (54.4908, -12.7517) ccw projected
  arc A159 (58.0508, -11.6583) -> (58.083, -11.1058) centre (0, -8) ccw projected
  arc A160 (58.083, -11.1058) -> (56.0676, -10.0655) centre (53.9123, -16.7135) ccw projected
  line L47 (56.0676, -10.0655) -> (54.9822, -9.7136) projected
  ellipse E47 centre (59.1601, -10.6475) end of major axis (60.6792, -22.3193) minor radius 11.3649 (54.4115, 0.085) -> (54.1178, -0.0572) ccw projected
  arc A161 (57.3297, 1.8278) -> (57.2336, 2.3728) centre (0, -8) ccw projected
  arc A162 (57.2336, 2.3728) -> (55.0326, 2.9203) centre (54.4685, -4.0456) ccw projected
  line L48 (55.0326, 2.9203) -> (53.8953, 3.0124) projected
  ellipse E48 centre (58.176, 3.0671) end of major axis (62.3459, -7.9398) minor radius 11.3649 (51.0803, 12.4152) -> (50.8273, 12.2092) ccw projected
  arc A163 (53.518, 14.784) -> (53.2988, 15.2922) centre (0, -8) ccw projected
  arc A164 (53.2988, 15.2922) -> (51.0308, 15.3173) centre (52.0884, 8.4092) ccw projected
  line L49 (51.0308, 15.3173) -> (49.9029, 15.1447) projected
  ellipse E49 centre (54.0556, 16.1851) end of major axis (60.6514, 6.4366) minor radius 11.3649 (44.9953, 23.6449) -> (44.7967, 23.386) ccw projected
  arc A165 (46.821, 26.512) -> (46.4905, 26.9559) centre (0, -8) ccw projected
  arc A166 (46.4905, 26.9559) -> (44.2779, 26.4573) centre (46.9001, 19.9793) ccw projected
  line L50 (44.2779, 26.4573) -> (43.2203, 26.0292) projected
  ellipse E50 centre (47.0211, 27.9993) end of major axis (55.6873, 20.0346) minor radius 11.3649 (36.4847, 33.1685) -> (36.3511, 32.8708) ccw projected
  arc A167 (37.5999, 36.3794) -> (37.176, 36.7351) centre (0, -8) ccw projected
  arc A168 (37.176, 36.7351) -> (35.138, 35.7397) centre (39.1835, 30.041) ccw projected
  line L51 (35.138, 35.7397) -> (34.2076, 35.0792) projected
  ellipse E51 centre (37.4516, 37.8727) end of major axis (47.721, 32.1213) minor radius 11.3649 (26.0071, 40.4728) -> (25.9458, 40.1523) ccw projected
  arc A169 (26.3518, 43.8543) -> (25.8573, 44.1026) centre (0, -8) ccw projected
  arc A170 (25.8573, 44.1026) -> (24.1038, 42.6641) centre (29.3544, 38.0519) ccw projected
  line L52 (24.1038, 42.6641) -> (23.3508, 41.8068) projected
  ellipse E52 centre (25.8631, 45.2731) end of major axis (37.1821, 42.045) minor radius 11.3649 (14.1275, 45.1638) -> (14.1417, 44.8378) ccw projected
  arc A171 (14.1017, 46.3046) -> (13.6831, 48.5337) centre (7.1148, 46.1465) ccw projected
  arc A172 (13.6831, 48.5337) -> (13.1446, 48.6613) centre (0, -8) ccw projected
  arc A173 (13.1446, 48.6613) -> (11.7701, 46.8571) centre (17.9429, 43.5802) ccw projected
  line L53 (11.7701, 46.8571) -> (11.2351, 45.8493) projected
  ellipse E53 centre (0.7968, 51.214) end of major axis (-10.7669, 53.4091) minor radius 11.3649 (11.0761, 45.5644) -> (11.2351, 45.8493) ccw projected
  point P0 (0, 0)
  dimension "d0" = 24.13
  dimension "d1" = 44.45
  dimension "d2" = 63.5
  dimension "d3" = 2.54
  dimension "d4" = 2.54
  dimension "d5" = 2.54
  dimension "d6" = 2.54
extrude "Extrusion1" add sketch "Sketch1" along normal blind 6.35 contours A58 A56 A115 | A56 A115 A58 | A115 A56 A117 A118 A116 | A116 A56 A61 | A56 A61 A116 | A117 A56 A59 | A56 A59 A117 | A118 A56 A60 | A56 A60 A118 | A57
sketch "Sketch2" plane through (0, -8, 6.35) normal (0, 0, 1) x (1, 0, 0)
  circle A0 centre (0, 22.225) radius 1.27 projected
  point P0 (0, 8)
hole "Hole1" at (0, 14.225, 6.35) direction (0, 0, -1) diameter 3.302 depth 6.35 thread size "8-32 UNC" class "2B" standard "ANSI Unified Screw Threads"
pattern_circular "Circular Pattern1" count 4 over 360 about axis through (0, -8, 0) along (0, 0, 1) of "Hole1"
sketch "Sketch3" plane through (0, -8, 6.35) normal (0, 0, 1) x (1, 0, 0)
  circle A0 centre (-22.225, 0) radius 1.651 projected
  circle A1 centre (-22.225, 0) radius 9.525
  circle A2 centre (0, 22.225) radius 1.651 projected
  circle A3 centre (0, 22.225) radius 9.525
  circle A4 centre (0, 0) radius 31.75 projected
  circle A5 centre (0, 0) radius 12.065 projected
  circle A6 centre (0, 0) radius 16.6688
  arc A7 (-20.2091, 9.3092) -> (-9.3092, 20.2091) centre (-18.2688, 18.2688) ccw
  circle A8 centre (0, -22.225) radius 1.651 projected
  circle A9 centre (22.225, 0) radius 1.651 projected
  circle A10 centre (0, -22.225) radius 9.525
  circle A11 centre (22.225, 0) radius 9.525
  circle A12 centre (0, 0) radius 16.6688
  arc A13 (-9.3092, -20.2091) -> (-20.2091, -9.3092) centre (-18.2688, -18.2688) ccw
  circle A14 centre (0, 0) radius 16.6688
  arc A15 (20.2091, -9.3092) -> (9.3092, -20.2091) centre (18.2688, -18.2688) ccw
  circle A16 centre (0, 0) radius 16.6688
  arc A17 (9.3092, 20.2091) -> (20.2091, 9.3092) centre (18.2688, 18.2688) ccw
  point P0 (0, 8)
  point P1 (9.3092, -20.2091)
  point P2 (0, -31.75)
  point P3 (31.75, 0)
  point P4 (20.2091, -9.3092)
  point P5 (0, 31.75)
  point P6 (9.3092, 20.2091)
  point P7 (-20.2091, -9.3092)
  point P8 (-31.75, 0)
  point P9 (-9.3092, -20.2091)
  dimension "d19" = 33.3375
  dimension "d22" = 360
extrude "Extrusion2" cut sketch "Sketch3" against normal blind 25.4 contours A1 A4 A3 A7 | A13 A10 A4 A1 | A4 A11 A17 A3 | A10 A15 A11 A4
properties part number "drive sprocket flange"
